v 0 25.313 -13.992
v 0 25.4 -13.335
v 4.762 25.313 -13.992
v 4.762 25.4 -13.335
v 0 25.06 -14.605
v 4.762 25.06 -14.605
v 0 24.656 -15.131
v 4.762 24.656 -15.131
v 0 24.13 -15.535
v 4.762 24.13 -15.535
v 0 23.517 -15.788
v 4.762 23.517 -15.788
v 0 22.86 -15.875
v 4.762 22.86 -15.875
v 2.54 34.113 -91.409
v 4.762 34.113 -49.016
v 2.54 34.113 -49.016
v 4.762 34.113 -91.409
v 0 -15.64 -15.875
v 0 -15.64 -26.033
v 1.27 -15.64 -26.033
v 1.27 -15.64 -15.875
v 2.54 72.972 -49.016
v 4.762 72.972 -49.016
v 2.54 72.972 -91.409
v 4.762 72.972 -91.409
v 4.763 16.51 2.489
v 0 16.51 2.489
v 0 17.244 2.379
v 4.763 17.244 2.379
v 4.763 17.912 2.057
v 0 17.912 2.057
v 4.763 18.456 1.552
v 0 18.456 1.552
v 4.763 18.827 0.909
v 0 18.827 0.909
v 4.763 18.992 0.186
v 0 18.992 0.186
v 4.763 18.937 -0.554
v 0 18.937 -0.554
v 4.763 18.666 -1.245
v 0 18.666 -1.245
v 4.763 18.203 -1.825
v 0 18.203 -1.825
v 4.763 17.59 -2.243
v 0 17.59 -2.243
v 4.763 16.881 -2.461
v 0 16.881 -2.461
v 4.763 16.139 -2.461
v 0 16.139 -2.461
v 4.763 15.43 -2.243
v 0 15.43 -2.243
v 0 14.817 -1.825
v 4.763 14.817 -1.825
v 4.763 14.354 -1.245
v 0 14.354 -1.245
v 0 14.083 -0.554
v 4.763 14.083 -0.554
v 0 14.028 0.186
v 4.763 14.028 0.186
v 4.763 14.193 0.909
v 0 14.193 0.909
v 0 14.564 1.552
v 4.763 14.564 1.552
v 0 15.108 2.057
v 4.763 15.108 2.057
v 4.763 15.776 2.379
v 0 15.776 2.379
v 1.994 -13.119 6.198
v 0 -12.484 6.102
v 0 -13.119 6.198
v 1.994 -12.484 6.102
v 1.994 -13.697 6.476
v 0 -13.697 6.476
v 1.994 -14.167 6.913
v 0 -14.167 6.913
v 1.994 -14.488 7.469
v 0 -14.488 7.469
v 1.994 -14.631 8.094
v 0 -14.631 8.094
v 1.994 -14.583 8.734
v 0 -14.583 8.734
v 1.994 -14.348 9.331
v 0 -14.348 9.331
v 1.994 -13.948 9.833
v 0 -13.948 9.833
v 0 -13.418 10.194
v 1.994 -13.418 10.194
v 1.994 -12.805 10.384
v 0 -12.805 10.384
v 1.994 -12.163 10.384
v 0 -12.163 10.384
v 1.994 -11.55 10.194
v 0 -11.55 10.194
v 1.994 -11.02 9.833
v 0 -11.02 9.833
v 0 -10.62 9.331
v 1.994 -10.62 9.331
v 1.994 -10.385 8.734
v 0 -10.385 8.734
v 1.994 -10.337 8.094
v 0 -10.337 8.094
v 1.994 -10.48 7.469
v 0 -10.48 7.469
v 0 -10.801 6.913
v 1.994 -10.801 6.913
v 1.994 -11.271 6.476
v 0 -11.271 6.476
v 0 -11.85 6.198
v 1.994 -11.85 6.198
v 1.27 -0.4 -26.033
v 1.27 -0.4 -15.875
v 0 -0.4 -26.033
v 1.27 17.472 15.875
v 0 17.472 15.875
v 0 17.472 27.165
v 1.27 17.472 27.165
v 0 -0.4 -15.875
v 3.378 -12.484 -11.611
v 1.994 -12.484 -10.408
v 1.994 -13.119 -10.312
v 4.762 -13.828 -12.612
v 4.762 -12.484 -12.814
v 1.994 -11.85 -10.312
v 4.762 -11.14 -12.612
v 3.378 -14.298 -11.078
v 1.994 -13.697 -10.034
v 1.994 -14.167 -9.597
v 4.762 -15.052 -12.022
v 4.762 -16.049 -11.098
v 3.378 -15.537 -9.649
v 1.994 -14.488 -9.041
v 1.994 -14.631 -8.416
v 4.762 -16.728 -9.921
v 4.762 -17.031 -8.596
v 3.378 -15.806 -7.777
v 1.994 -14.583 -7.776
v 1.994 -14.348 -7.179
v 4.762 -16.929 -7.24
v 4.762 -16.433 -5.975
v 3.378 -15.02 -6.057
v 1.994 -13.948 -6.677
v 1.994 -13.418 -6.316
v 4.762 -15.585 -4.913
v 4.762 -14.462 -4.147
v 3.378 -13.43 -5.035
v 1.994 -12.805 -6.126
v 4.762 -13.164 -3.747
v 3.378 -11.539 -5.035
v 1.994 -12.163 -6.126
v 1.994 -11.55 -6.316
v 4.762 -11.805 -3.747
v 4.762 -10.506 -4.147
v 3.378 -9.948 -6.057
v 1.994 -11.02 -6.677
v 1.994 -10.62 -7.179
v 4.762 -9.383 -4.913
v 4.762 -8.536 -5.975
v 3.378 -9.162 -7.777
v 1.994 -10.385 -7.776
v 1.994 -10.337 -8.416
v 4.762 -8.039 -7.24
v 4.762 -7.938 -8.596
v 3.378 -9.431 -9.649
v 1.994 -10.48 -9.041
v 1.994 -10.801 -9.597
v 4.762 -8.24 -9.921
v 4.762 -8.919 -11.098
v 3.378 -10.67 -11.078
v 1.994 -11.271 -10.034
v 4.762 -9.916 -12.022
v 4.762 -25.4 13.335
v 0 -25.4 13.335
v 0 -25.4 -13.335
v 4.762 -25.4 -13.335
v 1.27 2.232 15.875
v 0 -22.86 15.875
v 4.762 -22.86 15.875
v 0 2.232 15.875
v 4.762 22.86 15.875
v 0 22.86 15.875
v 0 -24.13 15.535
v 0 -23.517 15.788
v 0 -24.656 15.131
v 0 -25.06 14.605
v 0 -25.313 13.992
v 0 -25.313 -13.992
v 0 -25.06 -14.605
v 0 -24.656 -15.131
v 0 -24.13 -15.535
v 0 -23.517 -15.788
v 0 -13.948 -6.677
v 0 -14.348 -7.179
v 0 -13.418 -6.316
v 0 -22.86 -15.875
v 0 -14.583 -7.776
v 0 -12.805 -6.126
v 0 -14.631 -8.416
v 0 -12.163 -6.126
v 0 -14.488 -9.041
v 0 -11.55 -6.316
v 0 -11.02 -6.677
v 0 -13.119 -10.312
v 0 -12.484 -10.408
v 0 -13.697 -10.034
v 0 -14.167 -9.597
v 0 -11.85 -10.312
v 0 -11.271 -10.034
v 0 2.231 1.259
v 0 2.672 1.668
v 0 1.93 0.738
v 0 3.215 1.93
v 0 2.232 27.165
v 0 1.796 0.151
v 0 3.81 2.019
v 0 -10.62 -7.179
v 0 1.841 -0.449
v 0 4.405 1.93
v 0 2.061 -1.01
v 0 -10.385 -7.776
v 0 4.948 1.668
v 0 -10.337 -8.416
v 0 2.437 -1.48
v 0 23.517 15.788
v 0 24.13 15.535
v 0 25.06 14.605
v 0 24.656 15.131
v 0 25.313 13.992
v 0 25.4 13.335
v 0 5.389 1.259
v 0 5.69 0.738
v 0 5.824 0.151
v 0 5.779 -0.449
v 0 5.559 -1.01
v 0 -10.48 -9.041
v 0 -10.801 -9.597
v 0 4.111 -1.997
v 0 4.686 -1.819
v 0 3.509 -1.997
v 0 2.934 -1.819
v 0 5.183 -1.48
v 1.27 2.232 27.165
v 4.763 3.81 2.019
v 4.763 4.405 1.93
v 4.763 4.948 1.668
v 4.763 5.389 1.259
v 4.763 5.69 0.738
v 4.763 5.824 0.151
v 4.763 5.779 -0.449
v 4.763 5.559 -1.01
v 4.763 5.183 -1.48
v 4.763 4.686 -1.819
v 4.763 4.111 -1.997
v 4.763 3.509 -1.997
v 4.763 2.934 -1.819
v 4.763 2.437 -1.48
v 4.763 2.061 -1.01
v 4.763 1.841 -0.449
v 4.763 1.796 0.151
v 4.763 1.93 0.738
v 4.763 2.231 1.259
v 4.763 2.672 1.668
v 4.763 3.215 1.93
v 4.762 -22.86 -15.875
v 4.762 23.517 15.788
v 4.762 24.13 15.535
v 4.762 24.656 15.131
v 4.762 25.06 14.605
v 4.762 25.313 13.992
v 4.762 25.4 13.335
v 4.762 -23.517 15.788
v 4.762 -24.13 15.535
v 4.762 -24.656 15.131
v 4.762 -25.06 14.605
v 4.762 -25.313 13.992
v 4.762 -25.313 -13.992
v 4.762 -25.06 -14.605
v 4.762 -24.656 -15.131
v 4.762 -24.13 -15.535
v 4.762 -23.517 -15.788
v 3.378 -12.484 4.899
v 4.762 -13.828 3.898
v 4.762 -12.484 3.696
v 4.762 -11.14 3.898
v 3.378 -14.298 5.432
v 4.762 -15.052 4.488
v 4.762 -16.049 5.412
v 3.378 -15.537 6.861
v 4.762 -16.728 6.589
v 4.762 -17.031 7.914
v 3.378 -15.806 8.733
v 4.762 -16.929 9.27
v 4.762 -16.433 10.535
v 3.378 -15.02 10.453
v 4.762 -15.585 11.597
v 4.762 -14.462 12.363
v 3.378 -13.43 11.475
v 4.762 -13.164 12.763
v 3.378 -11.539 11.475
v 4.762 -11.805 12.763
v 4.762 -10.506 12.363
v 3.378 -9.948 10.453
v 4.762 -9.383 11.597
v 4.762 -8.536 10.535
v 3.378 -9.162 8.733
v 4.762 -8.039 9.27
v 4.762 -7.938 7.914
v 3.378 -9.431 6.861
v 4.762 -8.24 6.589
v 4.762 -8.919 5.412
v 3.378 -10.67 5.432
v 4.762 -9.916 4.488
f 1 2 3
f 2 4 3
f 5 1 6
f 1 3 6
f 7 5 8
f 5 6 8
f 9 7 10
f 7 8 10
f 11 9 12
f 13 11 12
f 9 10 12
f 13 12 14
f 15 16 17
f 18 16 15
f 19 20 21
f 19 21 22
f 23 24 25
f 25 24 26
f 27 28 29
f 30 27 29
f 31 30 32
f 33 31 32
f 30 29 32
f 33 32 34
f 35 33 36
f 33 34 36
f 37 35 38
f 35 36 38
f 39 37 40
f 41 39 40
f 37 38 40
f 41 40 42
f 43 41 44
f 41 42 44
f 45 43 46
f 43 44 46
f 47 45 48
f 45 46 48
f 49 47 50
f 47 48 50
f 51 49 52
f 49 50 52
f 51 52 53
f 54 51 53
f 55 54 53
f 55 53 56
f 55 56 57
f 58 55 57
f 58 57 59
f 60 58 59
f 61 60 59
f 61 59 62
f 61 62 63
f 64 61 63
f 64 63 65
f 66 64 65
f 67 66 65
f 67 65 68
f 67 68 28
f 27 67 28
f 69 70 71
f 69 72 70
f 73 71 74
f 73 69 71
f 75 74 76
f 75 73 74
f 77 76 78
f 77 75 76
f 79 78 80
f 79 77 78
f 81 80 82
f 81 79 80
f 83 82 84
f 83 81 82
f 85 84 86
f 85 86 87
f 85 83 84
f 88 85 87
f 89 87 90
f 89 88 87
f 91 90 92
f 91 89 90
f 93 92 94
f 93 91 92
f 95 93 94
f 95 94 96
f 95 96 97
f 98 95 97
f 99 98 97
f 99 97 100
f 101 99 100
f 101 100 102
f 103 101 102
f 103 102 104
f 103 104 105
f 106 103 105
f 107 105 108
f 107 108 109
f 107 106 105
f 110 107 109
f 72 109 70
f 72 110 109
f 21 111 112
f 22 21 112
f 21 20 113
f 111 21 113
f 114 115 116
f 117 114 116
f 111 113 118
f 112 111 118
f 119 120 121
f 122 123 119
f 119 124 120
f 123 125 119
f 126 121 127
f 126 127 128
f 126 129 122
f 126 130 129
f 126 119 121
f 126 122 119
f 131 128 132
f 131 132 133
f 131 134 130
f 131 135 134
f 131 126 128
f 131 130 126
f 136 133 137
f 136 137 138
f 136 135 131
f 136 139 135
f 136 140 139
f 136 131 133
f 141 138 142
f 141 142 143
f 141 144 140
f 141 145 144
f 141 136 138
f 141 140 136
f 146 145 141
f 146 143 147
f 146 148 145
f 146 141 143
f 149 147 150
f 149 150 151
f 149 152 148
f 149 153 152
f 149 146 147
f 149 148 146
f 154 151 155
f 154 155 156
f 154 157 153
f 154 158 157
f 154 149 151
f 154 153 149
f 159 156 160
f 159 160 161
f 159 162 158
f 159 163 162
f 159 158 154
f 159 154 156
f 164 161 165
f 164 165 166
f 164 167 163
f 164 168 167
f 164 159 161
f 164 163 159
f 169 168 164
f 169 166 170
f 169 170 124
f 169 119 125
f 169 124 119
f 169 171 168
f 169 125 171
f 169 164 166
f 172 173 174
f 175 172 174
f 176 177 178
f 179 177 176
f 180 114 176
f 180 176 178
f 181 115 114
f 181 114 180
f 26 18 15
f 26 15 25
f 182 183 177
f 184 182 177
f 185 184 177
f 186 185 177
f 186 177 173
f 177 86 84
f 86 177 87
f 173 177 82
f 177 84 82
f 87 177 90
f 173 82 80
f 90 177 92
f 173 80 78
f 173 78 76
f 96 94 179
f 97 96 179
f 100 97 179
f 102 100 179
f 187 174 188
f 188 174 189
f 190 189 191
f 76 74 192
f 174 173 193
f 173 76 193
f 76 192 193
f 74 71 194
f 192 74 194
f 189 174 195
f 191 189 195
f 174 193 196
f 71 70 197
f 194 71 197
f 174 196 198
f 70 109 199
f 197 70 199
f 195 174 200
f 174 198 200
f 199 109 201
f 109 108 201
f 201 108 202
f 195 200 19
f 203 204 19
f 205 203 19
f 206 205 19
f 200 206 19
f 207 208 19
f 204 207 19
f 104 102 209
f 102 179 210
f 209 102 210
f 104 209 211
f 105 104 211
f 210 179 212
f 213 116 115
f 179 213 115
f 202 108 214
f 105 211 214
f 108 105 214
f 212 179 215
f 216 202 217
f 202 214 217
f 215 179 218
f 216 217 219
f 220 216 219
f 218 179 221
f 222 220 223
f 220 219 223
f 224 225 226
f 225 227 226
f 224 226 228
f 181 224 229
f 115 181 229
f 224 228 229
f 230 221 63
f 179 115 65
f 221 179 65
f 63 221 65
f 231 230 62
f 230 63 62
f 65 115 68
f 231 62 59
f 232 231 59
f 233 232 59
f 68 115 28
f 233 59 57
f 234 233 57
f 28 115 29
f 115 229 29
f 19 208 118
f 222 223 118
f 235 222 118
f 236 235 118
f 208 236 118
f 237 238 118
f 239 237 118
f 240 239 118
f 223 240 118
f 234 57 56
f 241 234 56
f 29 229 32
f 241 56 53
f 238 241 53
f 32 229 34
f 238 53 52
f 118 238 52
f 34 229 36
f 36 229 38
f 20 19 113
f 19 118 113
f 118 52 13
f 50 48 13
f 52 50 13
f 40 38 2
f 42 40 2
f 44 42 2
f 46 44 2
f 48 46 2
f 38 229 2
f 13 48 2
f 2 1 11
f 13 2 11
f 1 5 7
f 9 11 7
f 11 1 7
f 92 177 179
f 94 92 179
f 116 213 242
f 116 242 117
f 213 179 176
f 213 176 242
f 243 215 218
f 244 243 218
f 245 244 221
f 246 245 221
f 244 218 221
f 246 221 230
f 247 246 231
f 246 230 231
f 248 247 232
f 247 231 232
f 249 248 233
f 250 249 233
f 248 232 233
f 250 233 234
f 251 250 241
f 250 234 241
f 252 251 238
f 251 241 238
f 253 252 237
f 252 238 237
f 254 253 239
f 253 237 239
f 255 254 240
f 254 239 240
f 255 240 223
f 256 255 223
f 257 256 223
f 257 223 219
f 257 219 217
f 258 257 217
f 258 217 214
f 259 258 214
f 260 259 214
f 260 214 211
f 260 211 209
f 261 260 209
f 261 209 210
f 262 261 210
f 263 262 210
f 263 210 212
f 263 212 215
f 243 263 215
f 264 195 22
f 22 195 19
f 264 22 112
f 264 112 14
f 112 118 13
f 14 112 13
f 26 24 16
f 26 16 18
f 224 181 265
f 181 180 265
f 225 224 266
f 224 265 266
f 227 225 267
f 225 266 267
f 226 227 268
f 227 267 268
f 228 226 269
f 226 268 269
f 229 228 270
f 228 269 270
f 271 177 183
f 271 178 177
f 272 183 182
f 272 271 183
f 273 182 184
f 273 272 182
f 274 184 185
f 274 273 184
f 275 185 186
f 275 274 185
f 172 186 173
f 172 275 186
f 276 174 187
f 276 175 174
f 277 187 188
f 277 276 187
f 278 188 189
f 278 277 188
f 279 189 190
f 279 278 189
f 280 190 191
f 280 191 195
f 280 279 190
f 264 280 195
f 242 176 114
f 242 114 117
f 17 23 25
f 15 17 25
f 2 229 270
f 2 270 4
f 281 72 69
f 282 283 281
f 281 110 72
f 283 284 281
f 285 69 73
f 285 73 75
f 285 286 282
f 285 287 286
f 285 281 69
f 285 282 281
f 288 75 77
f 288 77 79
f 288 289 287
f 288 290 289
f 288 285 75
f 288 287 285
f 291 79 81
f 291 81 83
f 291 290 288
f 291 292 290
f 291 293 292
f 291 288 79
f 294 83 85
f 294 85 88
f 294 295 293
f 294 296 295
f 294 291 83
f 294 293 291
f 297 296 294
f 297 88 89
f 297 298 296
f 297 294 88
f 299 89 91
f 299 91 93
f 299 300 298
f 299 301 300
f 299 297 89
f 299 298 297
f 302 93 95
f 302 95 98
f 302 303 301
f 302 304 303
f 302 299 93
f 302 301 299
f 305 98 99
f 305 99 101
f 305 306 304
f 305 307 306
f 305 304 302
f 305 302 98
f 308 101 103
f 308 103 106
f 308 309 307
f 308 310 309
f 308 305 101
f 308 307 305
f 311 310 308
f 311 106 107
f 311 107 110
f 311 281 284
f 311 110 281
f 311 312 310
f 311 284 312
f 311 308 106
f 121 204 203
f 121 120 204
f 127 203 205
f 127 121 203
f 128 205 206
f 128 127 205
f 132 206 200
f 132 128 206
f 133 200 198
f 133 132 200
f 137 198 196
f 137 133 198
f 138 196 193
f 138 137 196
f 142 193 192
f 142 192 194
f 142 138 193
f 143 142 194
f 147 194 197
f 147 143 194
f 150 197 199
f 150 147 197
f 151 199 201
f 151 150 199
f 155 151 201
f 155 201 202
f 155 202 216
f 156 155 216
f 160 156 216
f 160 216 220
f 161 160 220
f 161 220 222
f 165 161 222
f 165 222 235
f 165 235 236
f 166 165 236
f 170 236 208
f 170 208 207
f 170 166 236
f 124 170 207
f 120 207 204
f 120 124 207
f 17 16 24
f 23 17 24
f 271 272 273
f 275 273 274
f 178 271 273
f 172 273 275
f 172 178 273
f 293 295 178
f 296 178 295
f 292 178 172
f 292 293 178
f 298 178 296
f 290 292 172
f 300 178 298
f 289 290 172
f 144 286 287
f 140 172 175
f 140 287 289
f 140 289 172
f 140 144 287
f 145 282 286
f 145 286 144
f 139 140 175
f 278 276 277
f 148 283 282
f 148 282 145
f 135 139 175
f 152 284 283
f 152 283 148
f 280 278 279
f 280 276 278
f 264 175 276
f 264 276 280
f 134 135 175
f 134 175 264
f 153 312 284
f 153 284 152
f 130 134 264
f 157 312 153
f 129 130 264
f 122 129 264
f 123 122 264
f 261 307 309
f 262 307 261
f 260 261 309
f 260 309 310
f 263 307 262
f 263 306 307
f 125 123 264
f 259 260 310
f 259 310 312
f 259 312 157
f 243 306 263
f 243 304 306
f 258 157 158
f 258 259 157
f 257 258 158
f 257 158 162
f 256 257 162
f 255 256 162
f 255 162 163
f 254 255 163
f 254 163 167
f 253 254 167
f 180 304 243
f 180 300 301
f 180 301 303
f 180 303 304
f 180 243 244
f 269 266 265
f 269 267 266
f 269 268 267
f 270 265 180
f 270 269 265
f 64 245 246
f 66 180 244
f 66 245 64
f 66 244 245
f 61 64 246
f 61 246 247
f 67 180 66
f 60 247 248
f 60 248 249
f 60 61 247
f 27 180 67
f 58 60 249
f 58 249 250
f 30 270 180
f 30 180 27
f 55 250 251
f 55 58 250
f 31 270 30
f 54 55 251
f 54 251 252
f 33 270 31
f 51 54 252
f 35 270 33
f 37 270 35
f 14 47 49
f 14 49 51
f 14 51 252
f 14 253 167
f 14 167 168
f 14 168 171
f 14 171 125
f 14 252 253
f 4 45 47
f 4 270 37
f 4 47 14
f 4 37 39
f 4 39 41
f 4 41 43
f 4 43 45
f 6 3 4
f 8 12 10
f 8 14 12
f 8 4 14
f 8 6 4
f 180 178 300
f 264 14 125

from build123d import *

# Parameters (mm, degrees)
SKETCH1_W                                     = 31.75
SKETCH1_H                                     = 50.8
BOSS_EXTRUDE1_DEPTH                           = 4.7625
CSK_FOR_8_FLAT_HEAD_SOCKET_CAP_SCREW1_A_COUNT = 2
CSK_FOR_8_FLAT_HEAD_SOCKET_CAP_SCREW1_A_PITCH = 16.51
F_10_CLEARANCE_HOLE1_D                        = 4.9784
FILLET1_R                                     = 2.54
F_10_32_TAPPED_HOLE1_D                        = 4.0386
SKETCH10_W                                    = 42.392471332
SKETCH10_H                                    = 38.859765387
BOSS_EXTRUDE2_DEPTH                           = 2.2225
SKETCH11_W                                    = 11.290377963
SKETCH11_H                                    = 15.24
SKETCH11_W_2                                  = 10.158335204
BOSS_EXTRUDE3_DEPTH                           = 1.27


with BuildPart() as part:
    # Sketch1 → Boss-Extrude1 (new body)
    with BuildSketch(Plane(origin=(0, 0, 0), x_dir=(0, 0, -1), z_dir=(1, 0, 0))):
        Rectangle(SKETCH1_W, SKETCH1_H)
    extrude(amount=BOSS_EXTRUDE1_DEPTH)

    # Sketch5 → CSK for #8 Flat Head Socket Cap Screw1 (revolve, cut)
    with BuildSketch(Plane(origin=(4.7625, -12.4841, 8.255), x_dir=(0, 0, -1), z_dir=(0, 1, 0))):
        Polygon((0, 0), (0, 4.7625), (2.15265, 4.7625), (2.15265, 2.768534127), (4.5593, 0), align=None)
    csk_for_8_flat_head_socket_cap_screw1 = revolve(axis=Axis((11.1125, -12.4841, 8.255), (-1, 0, 0)), mode=Mode.SUBTRACT)

    # CSK for #8 Flat Head Socket Cap Screw1 a: CSK for #8 Flat Head Socket Cap Screw1 ×2
    with Locations(*[(0, 0, -i * CSK_FOR_8_FLAT_HEAD_SOCKET_CAP_SCREW1_A_PITCH) for i in range(1, CSK_FOR_8_FLAT_HEAD_SOCKET_CAP_SCREW1_A_COUNT)]):
        add(csk_for_8_flat_head_socket_cap_screw1, mode=Mode.SUBTRACT)

    # #10 Clearance Hole1 (through all)
    with Locations(Plane(origin=(4.7625, 0, 0), x_dir=(0, 0, -1), z_dir=(1, 0, 0))):
        with Locations((0, 16.51)):
            Hole(F_10_CLEARANCE_HOLE1_D / 2)

    # Fillet1
    fillet1_edges = [part.edges().sort_by_distance(p)[0] for p in [
        (2.38125, -25.4, -15.875),
        (2.38125, -25.4, 15.875),
        (2.38125, 25.4, 15.875),
        (2.38125, 25.4, -15.875),
    ]]
    fillet(fillet1_edges, radius=FILLET1_R)

    # #10-32 Tapped Hole1 (through all)
    with Locations(Plane(origin=(4.7625, 0, 0), x_dir=(0, 0, -1), z_dir=(1, 0, 0))):
        with Locations((0, 3.81)):
            Hole(F_10_32_TAPPED_HOLE1_D / 2)

    # Sketch11 → Boss-Extrude3 (add)
    with BuildSketch(Plane.ZY):
        with Locations((21.520188982, 9.851988794)):
            Rectangle(SKETCH11_W, SKETCH11_H)
        with Locations((-20.954167602, -8.02048127)):
            Rectangle(SKETCH11_W_2, SKETCH11_H)
    extrude(amount=-BOSS_EXTRUDE3_DEPTH)


with BuildPart() as body_2:
    # Sketch10 → Boss-Extrude2 (new body)
    with BuildSketch(Plane(origin=(4.7625, 0, 0), x_dir=(0, 0, -1), z_dir=(1, 0, 0))):
        with Locations((70.212530643, 53.542574468)):
            Rectangle(SKETCH10_W, SKETCH10_H)
    extrude(amount=-BOSS_EXTRUDE2_DEPTH)


solid = Compound([part.part, body_2.part])
